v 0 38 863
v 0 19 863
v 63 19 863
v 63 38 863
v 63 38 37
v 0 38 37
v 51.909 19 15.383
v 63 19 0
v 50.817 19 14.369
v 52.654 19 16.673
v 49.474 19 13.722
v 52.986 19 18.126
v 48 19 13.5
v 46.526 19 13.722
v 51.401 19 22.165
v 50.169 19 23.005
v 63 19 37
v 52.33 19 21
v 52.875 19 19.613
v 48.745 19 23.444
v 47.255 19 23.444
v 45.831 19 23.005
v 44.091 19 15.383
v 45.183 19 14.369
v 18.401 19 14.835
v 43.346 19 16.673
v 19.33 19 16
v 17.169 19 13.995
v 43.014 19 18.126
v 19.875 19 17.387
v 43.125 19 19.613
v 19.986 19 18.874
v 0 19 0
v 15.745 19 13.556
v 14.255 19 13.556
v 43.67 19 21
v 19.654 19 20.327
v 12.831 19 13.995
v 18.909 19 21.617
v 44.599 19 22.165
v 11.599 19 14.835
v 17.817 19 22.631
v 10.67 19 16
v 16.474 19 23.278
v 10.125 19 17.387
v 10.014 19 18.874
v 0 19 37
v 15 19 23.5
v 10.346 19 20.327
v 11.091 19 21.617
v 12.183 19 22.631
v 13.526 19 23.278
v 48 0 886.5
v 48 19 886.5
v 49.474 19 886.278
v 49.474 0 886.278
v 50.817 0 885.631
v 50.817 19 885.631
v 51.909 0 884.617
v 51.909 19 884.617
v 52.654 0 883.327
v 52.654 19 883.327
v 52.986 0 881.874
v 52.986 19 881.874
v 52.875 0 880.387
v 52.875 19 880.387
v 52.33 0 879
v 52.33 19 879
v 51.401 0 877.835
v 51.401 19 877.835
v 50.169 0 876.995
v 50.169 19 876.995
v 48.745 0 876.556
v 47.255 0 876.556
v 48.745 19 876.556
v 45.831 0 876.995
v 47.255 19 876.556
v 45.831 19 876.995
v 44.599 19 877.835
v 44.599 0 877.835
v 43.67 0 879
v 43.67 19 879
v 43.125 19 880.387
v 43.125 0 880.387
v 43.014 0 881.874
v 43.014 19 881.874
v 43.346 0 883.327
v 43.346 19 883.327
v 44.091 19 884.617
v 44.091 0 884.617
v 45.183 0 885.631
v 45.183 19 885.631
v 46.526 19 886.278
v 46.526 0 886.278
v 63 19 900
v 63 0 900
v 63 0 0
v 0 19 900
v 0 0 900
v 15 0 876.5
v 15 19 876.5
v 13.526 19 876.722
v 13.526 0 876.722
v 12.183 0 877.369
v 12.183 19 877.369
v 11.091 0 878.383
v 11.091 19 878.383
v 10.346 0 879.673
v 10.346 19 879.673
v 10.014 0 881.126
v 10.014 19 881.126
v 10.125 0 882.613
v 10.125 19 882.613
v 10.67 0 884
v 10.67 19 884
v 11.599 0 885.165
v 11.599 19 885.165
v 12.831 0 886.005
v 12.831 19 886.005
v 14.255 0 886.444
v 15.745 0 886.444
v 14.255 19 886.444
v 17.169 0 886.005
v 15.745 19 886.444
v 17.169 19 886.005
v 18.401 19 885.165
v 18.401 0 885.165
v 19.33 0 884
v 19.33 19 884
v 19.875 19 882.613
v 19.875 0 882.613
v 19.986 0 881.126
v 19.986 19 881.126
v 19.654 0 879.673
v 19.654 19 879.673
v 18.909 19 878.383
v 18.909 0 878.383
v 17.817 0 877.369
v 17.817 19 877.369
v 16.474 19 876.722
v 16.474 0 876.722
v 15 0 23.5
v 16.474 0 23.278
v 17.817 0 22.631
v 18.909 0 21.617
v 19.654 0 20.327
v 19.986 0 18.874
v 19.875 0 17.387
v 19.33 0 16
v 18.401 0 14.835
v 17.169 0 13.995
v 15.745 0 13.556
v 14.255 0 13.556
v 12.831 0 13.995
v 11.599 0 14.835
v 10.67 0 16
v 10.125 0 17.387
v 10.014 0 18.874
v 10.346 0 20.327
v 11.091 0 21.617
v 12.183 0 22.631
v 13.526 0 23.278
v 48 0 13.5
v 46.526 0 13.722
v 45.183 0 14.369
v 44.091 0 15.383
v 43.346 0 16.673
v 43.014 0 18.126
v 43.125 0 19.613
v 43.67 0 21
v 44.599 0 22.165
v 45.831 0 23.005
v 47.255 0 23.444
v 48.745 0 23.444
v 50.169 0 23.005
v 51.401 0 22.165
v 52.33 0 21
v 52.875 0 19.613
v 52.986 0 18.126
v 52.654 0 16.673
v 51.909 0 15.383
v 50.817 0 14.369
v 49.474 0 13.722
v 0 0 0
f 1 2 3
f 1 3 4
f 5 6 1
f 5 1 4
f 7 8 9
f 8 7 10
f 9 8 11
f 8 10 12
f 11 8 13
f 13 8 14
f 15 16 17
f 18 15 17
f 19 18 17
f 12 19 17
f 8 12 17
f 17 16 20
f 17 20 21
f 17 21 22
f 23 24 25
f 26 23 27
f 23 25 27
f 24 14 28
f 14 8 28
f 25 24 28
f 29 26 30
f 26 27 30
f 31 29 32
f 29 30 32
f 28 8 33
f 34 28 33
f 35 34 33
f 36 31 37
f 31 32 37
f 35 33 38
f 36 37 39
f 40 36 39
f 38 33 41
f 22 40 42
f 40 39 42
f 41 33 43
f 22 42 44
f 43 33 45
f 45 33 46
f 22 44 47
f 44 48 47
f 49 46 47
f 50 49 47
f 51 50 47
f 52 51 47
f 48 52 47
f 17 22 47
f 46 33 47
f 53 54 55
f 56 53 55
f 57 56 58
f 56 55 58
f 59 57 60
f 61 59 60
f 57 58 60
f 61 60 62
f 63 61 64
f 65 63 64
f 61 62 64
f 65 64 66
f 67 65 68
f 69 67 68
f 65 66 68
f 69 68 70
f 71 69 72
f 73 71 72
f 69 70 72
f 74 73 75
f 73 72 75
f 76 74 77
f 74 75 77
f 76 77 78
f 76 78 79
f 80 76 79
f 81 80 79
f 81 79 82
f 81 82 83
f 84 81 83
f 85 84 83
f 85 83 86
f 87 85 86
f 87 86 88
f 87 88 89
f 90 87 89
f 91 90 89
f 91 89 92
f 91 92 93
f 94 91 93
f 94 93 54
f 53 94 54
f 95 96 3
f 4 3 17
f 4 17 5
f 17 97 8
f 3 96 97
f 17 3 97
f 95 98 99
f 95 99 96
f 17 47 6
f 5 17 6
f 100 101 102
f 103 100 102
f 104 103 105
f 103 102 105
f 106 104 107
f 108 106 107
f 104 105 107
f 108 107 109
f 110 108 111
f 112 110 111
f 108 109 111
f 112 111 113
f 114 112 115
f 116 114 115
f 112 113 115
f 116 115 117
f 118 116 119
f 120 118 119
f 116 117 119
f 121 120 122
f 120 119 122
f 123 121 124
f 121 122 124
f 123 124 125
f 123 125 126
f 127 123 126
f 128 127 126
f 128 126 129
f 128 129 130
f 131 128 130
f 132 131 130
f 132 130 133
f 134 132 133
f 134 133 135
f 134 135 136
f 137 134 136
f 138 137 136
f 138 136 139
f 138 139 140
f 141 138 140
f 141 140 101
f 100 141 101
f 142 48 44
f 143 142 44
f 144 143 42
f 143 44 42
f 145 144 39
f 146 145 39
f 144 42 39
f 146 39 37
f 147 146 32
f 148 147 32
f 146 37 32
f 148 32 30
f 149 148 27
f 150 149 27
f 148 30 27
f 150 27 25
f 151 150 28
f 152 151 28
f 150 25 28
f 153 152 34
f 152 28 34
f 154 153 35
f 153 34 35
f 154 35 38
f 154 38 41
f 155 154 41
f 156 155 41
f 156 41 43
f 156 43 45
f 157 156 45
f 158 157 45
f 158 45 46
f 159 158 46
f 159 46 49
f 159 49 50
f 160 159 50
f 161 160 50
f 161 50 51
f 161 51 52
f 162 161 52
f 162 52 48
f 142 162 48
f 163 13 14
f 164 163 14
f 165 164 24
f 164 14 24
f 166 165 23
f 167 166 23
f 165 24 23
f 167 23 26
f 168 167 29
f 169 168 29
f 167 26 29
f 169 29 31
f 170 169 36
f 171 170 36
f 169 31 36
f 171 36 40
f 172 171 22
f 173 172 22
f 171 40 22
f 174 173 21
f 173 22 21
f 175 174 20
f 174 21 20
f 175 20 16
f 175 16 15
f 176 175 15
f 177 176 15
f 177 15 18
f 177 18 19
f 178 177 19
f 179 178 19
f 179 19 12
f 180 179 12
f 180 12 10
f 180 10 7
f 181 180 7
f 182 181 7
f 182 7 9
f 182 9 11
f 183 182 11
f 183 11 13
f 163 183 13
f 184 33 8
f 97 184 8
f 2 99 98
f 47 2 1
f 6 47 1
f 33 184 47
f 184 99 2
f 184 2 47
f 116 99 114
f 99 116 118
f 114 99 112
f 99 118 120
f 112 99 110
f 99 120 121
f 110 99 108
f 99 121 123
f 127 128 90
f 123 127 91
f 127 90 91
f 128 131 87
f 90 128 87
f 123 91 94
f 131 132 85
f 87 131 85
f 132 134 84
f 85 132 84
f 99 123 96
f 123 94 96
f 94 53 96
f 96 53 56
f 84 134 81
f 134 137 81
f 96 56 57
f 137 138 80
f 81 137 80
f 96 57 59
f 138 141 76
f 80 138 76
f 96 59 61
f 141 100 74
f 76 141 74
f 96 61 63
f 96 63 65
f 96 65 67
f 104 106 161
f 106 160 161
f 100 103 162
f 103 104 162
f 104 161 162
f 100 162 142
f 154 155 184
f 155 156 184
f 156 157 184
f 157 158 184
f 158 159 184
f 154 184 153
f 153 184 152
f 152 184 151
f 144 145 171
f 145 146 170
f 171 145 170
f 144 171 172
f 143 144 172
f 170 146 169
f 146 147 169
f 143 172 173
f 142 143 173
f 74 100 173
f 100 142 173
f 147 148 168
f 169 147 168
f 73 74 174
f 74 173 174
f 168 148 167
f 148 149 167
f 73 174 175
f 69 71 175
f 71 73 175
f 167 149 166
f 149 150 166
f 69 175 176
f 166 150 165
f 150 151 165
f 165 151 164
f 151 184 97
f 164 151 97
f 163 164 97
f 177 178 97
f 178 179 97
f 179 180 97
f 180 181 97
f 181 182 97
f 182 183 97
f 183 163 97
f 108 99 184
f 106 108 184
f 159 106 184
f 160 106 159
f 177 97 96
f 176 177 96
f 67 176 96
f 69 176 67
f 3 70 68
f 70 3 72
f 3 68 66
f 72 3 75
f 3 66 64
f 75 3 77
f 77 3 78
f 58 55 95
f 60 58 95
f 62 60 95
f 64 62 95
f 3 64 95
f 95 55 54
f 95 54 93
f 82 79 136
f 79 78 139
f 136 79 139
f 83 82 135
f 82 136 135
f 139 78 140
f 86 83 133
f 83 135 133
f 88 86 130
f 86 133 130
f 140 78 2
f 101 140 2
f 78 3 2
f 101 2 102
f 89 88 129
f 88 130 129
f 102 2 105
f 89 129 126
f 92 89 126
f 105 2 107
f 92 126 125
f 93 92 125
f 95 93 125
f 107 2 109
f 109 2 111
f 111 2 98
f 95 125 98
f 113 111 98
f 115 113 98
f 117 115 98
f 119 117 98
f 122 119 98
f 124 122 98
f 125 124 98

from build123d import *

# Parameters (mm, degrees)
ESQUISSE1_W             = 63
ESQUISSE1_H             = 38
BOSS_EXTRU_1_DEPTH      = 900
ESQUISSE2_W             = 37
ESQUISSE2_H             = 19
ENL_V_MAT_EXTRU_1_DEPTH = 904.002214837
ESQUISSE3_R             = 5
ENL_V_MAT_EXTRU_2_DEPTH = 903.402349288


with BuildPart() as part:
    # Esquisse1 → Boss.-Extru.1 (new body)
    with BuildSketch(Plane.XY):
        with Locations((31.5, 19)):
            Rectangle(ESQUISSE1_W, ESQUISSE1_H)
    extrude(amount=BOSS_EXTRU_1_DEPTH)

    # Esquisse2 → Enlèv. mat.-Extru.1 (cut, through all)
    with BuildSketch(Plane.ZY):
        with Locations((18.5, 28.5)):
            Rectangle(ESQUISSE2_W, ESQUISSE2_H)
        with Locations((881.5, 28.5)):
            Rectangle(ESQUISSE2_W, ESQUISSE2_H)
    extrude(amount=-ENL_V_MAT_EXTRU_1_DEPTH, mode=Mode.SUBTRACT)

    # Esquisse3 → Enlèv. mat.-Extru.2 (cut, through all)
    with BuildSketch(Plane(origin=(0, 19, 0), x_dir=(1, 0, 0), z_dir=(0, 1, 0))):
        with Locations(Location((15, -18.5, 0), (0, 0, 270))):
            Circle(ESQUISSE3_R)
        with Locations(Location((48, -18.5, 0), (0, 0, 90))):
            Circle(ESQUISSE3_R)
        with Locations(Location((48, -881.5, 0), (0, 0, 270))):
            Circle(ESQUISSE3_R)
        with Locations(Location((15, -881.5, 0), (0, 0, 90))):
            Circle(ESQUISSE3_R)
    extrude(amount=-ENL_V_MAT_EXTRU_2_DEPTH, mode=Mode.SUBTRACT)


solid = part.part
